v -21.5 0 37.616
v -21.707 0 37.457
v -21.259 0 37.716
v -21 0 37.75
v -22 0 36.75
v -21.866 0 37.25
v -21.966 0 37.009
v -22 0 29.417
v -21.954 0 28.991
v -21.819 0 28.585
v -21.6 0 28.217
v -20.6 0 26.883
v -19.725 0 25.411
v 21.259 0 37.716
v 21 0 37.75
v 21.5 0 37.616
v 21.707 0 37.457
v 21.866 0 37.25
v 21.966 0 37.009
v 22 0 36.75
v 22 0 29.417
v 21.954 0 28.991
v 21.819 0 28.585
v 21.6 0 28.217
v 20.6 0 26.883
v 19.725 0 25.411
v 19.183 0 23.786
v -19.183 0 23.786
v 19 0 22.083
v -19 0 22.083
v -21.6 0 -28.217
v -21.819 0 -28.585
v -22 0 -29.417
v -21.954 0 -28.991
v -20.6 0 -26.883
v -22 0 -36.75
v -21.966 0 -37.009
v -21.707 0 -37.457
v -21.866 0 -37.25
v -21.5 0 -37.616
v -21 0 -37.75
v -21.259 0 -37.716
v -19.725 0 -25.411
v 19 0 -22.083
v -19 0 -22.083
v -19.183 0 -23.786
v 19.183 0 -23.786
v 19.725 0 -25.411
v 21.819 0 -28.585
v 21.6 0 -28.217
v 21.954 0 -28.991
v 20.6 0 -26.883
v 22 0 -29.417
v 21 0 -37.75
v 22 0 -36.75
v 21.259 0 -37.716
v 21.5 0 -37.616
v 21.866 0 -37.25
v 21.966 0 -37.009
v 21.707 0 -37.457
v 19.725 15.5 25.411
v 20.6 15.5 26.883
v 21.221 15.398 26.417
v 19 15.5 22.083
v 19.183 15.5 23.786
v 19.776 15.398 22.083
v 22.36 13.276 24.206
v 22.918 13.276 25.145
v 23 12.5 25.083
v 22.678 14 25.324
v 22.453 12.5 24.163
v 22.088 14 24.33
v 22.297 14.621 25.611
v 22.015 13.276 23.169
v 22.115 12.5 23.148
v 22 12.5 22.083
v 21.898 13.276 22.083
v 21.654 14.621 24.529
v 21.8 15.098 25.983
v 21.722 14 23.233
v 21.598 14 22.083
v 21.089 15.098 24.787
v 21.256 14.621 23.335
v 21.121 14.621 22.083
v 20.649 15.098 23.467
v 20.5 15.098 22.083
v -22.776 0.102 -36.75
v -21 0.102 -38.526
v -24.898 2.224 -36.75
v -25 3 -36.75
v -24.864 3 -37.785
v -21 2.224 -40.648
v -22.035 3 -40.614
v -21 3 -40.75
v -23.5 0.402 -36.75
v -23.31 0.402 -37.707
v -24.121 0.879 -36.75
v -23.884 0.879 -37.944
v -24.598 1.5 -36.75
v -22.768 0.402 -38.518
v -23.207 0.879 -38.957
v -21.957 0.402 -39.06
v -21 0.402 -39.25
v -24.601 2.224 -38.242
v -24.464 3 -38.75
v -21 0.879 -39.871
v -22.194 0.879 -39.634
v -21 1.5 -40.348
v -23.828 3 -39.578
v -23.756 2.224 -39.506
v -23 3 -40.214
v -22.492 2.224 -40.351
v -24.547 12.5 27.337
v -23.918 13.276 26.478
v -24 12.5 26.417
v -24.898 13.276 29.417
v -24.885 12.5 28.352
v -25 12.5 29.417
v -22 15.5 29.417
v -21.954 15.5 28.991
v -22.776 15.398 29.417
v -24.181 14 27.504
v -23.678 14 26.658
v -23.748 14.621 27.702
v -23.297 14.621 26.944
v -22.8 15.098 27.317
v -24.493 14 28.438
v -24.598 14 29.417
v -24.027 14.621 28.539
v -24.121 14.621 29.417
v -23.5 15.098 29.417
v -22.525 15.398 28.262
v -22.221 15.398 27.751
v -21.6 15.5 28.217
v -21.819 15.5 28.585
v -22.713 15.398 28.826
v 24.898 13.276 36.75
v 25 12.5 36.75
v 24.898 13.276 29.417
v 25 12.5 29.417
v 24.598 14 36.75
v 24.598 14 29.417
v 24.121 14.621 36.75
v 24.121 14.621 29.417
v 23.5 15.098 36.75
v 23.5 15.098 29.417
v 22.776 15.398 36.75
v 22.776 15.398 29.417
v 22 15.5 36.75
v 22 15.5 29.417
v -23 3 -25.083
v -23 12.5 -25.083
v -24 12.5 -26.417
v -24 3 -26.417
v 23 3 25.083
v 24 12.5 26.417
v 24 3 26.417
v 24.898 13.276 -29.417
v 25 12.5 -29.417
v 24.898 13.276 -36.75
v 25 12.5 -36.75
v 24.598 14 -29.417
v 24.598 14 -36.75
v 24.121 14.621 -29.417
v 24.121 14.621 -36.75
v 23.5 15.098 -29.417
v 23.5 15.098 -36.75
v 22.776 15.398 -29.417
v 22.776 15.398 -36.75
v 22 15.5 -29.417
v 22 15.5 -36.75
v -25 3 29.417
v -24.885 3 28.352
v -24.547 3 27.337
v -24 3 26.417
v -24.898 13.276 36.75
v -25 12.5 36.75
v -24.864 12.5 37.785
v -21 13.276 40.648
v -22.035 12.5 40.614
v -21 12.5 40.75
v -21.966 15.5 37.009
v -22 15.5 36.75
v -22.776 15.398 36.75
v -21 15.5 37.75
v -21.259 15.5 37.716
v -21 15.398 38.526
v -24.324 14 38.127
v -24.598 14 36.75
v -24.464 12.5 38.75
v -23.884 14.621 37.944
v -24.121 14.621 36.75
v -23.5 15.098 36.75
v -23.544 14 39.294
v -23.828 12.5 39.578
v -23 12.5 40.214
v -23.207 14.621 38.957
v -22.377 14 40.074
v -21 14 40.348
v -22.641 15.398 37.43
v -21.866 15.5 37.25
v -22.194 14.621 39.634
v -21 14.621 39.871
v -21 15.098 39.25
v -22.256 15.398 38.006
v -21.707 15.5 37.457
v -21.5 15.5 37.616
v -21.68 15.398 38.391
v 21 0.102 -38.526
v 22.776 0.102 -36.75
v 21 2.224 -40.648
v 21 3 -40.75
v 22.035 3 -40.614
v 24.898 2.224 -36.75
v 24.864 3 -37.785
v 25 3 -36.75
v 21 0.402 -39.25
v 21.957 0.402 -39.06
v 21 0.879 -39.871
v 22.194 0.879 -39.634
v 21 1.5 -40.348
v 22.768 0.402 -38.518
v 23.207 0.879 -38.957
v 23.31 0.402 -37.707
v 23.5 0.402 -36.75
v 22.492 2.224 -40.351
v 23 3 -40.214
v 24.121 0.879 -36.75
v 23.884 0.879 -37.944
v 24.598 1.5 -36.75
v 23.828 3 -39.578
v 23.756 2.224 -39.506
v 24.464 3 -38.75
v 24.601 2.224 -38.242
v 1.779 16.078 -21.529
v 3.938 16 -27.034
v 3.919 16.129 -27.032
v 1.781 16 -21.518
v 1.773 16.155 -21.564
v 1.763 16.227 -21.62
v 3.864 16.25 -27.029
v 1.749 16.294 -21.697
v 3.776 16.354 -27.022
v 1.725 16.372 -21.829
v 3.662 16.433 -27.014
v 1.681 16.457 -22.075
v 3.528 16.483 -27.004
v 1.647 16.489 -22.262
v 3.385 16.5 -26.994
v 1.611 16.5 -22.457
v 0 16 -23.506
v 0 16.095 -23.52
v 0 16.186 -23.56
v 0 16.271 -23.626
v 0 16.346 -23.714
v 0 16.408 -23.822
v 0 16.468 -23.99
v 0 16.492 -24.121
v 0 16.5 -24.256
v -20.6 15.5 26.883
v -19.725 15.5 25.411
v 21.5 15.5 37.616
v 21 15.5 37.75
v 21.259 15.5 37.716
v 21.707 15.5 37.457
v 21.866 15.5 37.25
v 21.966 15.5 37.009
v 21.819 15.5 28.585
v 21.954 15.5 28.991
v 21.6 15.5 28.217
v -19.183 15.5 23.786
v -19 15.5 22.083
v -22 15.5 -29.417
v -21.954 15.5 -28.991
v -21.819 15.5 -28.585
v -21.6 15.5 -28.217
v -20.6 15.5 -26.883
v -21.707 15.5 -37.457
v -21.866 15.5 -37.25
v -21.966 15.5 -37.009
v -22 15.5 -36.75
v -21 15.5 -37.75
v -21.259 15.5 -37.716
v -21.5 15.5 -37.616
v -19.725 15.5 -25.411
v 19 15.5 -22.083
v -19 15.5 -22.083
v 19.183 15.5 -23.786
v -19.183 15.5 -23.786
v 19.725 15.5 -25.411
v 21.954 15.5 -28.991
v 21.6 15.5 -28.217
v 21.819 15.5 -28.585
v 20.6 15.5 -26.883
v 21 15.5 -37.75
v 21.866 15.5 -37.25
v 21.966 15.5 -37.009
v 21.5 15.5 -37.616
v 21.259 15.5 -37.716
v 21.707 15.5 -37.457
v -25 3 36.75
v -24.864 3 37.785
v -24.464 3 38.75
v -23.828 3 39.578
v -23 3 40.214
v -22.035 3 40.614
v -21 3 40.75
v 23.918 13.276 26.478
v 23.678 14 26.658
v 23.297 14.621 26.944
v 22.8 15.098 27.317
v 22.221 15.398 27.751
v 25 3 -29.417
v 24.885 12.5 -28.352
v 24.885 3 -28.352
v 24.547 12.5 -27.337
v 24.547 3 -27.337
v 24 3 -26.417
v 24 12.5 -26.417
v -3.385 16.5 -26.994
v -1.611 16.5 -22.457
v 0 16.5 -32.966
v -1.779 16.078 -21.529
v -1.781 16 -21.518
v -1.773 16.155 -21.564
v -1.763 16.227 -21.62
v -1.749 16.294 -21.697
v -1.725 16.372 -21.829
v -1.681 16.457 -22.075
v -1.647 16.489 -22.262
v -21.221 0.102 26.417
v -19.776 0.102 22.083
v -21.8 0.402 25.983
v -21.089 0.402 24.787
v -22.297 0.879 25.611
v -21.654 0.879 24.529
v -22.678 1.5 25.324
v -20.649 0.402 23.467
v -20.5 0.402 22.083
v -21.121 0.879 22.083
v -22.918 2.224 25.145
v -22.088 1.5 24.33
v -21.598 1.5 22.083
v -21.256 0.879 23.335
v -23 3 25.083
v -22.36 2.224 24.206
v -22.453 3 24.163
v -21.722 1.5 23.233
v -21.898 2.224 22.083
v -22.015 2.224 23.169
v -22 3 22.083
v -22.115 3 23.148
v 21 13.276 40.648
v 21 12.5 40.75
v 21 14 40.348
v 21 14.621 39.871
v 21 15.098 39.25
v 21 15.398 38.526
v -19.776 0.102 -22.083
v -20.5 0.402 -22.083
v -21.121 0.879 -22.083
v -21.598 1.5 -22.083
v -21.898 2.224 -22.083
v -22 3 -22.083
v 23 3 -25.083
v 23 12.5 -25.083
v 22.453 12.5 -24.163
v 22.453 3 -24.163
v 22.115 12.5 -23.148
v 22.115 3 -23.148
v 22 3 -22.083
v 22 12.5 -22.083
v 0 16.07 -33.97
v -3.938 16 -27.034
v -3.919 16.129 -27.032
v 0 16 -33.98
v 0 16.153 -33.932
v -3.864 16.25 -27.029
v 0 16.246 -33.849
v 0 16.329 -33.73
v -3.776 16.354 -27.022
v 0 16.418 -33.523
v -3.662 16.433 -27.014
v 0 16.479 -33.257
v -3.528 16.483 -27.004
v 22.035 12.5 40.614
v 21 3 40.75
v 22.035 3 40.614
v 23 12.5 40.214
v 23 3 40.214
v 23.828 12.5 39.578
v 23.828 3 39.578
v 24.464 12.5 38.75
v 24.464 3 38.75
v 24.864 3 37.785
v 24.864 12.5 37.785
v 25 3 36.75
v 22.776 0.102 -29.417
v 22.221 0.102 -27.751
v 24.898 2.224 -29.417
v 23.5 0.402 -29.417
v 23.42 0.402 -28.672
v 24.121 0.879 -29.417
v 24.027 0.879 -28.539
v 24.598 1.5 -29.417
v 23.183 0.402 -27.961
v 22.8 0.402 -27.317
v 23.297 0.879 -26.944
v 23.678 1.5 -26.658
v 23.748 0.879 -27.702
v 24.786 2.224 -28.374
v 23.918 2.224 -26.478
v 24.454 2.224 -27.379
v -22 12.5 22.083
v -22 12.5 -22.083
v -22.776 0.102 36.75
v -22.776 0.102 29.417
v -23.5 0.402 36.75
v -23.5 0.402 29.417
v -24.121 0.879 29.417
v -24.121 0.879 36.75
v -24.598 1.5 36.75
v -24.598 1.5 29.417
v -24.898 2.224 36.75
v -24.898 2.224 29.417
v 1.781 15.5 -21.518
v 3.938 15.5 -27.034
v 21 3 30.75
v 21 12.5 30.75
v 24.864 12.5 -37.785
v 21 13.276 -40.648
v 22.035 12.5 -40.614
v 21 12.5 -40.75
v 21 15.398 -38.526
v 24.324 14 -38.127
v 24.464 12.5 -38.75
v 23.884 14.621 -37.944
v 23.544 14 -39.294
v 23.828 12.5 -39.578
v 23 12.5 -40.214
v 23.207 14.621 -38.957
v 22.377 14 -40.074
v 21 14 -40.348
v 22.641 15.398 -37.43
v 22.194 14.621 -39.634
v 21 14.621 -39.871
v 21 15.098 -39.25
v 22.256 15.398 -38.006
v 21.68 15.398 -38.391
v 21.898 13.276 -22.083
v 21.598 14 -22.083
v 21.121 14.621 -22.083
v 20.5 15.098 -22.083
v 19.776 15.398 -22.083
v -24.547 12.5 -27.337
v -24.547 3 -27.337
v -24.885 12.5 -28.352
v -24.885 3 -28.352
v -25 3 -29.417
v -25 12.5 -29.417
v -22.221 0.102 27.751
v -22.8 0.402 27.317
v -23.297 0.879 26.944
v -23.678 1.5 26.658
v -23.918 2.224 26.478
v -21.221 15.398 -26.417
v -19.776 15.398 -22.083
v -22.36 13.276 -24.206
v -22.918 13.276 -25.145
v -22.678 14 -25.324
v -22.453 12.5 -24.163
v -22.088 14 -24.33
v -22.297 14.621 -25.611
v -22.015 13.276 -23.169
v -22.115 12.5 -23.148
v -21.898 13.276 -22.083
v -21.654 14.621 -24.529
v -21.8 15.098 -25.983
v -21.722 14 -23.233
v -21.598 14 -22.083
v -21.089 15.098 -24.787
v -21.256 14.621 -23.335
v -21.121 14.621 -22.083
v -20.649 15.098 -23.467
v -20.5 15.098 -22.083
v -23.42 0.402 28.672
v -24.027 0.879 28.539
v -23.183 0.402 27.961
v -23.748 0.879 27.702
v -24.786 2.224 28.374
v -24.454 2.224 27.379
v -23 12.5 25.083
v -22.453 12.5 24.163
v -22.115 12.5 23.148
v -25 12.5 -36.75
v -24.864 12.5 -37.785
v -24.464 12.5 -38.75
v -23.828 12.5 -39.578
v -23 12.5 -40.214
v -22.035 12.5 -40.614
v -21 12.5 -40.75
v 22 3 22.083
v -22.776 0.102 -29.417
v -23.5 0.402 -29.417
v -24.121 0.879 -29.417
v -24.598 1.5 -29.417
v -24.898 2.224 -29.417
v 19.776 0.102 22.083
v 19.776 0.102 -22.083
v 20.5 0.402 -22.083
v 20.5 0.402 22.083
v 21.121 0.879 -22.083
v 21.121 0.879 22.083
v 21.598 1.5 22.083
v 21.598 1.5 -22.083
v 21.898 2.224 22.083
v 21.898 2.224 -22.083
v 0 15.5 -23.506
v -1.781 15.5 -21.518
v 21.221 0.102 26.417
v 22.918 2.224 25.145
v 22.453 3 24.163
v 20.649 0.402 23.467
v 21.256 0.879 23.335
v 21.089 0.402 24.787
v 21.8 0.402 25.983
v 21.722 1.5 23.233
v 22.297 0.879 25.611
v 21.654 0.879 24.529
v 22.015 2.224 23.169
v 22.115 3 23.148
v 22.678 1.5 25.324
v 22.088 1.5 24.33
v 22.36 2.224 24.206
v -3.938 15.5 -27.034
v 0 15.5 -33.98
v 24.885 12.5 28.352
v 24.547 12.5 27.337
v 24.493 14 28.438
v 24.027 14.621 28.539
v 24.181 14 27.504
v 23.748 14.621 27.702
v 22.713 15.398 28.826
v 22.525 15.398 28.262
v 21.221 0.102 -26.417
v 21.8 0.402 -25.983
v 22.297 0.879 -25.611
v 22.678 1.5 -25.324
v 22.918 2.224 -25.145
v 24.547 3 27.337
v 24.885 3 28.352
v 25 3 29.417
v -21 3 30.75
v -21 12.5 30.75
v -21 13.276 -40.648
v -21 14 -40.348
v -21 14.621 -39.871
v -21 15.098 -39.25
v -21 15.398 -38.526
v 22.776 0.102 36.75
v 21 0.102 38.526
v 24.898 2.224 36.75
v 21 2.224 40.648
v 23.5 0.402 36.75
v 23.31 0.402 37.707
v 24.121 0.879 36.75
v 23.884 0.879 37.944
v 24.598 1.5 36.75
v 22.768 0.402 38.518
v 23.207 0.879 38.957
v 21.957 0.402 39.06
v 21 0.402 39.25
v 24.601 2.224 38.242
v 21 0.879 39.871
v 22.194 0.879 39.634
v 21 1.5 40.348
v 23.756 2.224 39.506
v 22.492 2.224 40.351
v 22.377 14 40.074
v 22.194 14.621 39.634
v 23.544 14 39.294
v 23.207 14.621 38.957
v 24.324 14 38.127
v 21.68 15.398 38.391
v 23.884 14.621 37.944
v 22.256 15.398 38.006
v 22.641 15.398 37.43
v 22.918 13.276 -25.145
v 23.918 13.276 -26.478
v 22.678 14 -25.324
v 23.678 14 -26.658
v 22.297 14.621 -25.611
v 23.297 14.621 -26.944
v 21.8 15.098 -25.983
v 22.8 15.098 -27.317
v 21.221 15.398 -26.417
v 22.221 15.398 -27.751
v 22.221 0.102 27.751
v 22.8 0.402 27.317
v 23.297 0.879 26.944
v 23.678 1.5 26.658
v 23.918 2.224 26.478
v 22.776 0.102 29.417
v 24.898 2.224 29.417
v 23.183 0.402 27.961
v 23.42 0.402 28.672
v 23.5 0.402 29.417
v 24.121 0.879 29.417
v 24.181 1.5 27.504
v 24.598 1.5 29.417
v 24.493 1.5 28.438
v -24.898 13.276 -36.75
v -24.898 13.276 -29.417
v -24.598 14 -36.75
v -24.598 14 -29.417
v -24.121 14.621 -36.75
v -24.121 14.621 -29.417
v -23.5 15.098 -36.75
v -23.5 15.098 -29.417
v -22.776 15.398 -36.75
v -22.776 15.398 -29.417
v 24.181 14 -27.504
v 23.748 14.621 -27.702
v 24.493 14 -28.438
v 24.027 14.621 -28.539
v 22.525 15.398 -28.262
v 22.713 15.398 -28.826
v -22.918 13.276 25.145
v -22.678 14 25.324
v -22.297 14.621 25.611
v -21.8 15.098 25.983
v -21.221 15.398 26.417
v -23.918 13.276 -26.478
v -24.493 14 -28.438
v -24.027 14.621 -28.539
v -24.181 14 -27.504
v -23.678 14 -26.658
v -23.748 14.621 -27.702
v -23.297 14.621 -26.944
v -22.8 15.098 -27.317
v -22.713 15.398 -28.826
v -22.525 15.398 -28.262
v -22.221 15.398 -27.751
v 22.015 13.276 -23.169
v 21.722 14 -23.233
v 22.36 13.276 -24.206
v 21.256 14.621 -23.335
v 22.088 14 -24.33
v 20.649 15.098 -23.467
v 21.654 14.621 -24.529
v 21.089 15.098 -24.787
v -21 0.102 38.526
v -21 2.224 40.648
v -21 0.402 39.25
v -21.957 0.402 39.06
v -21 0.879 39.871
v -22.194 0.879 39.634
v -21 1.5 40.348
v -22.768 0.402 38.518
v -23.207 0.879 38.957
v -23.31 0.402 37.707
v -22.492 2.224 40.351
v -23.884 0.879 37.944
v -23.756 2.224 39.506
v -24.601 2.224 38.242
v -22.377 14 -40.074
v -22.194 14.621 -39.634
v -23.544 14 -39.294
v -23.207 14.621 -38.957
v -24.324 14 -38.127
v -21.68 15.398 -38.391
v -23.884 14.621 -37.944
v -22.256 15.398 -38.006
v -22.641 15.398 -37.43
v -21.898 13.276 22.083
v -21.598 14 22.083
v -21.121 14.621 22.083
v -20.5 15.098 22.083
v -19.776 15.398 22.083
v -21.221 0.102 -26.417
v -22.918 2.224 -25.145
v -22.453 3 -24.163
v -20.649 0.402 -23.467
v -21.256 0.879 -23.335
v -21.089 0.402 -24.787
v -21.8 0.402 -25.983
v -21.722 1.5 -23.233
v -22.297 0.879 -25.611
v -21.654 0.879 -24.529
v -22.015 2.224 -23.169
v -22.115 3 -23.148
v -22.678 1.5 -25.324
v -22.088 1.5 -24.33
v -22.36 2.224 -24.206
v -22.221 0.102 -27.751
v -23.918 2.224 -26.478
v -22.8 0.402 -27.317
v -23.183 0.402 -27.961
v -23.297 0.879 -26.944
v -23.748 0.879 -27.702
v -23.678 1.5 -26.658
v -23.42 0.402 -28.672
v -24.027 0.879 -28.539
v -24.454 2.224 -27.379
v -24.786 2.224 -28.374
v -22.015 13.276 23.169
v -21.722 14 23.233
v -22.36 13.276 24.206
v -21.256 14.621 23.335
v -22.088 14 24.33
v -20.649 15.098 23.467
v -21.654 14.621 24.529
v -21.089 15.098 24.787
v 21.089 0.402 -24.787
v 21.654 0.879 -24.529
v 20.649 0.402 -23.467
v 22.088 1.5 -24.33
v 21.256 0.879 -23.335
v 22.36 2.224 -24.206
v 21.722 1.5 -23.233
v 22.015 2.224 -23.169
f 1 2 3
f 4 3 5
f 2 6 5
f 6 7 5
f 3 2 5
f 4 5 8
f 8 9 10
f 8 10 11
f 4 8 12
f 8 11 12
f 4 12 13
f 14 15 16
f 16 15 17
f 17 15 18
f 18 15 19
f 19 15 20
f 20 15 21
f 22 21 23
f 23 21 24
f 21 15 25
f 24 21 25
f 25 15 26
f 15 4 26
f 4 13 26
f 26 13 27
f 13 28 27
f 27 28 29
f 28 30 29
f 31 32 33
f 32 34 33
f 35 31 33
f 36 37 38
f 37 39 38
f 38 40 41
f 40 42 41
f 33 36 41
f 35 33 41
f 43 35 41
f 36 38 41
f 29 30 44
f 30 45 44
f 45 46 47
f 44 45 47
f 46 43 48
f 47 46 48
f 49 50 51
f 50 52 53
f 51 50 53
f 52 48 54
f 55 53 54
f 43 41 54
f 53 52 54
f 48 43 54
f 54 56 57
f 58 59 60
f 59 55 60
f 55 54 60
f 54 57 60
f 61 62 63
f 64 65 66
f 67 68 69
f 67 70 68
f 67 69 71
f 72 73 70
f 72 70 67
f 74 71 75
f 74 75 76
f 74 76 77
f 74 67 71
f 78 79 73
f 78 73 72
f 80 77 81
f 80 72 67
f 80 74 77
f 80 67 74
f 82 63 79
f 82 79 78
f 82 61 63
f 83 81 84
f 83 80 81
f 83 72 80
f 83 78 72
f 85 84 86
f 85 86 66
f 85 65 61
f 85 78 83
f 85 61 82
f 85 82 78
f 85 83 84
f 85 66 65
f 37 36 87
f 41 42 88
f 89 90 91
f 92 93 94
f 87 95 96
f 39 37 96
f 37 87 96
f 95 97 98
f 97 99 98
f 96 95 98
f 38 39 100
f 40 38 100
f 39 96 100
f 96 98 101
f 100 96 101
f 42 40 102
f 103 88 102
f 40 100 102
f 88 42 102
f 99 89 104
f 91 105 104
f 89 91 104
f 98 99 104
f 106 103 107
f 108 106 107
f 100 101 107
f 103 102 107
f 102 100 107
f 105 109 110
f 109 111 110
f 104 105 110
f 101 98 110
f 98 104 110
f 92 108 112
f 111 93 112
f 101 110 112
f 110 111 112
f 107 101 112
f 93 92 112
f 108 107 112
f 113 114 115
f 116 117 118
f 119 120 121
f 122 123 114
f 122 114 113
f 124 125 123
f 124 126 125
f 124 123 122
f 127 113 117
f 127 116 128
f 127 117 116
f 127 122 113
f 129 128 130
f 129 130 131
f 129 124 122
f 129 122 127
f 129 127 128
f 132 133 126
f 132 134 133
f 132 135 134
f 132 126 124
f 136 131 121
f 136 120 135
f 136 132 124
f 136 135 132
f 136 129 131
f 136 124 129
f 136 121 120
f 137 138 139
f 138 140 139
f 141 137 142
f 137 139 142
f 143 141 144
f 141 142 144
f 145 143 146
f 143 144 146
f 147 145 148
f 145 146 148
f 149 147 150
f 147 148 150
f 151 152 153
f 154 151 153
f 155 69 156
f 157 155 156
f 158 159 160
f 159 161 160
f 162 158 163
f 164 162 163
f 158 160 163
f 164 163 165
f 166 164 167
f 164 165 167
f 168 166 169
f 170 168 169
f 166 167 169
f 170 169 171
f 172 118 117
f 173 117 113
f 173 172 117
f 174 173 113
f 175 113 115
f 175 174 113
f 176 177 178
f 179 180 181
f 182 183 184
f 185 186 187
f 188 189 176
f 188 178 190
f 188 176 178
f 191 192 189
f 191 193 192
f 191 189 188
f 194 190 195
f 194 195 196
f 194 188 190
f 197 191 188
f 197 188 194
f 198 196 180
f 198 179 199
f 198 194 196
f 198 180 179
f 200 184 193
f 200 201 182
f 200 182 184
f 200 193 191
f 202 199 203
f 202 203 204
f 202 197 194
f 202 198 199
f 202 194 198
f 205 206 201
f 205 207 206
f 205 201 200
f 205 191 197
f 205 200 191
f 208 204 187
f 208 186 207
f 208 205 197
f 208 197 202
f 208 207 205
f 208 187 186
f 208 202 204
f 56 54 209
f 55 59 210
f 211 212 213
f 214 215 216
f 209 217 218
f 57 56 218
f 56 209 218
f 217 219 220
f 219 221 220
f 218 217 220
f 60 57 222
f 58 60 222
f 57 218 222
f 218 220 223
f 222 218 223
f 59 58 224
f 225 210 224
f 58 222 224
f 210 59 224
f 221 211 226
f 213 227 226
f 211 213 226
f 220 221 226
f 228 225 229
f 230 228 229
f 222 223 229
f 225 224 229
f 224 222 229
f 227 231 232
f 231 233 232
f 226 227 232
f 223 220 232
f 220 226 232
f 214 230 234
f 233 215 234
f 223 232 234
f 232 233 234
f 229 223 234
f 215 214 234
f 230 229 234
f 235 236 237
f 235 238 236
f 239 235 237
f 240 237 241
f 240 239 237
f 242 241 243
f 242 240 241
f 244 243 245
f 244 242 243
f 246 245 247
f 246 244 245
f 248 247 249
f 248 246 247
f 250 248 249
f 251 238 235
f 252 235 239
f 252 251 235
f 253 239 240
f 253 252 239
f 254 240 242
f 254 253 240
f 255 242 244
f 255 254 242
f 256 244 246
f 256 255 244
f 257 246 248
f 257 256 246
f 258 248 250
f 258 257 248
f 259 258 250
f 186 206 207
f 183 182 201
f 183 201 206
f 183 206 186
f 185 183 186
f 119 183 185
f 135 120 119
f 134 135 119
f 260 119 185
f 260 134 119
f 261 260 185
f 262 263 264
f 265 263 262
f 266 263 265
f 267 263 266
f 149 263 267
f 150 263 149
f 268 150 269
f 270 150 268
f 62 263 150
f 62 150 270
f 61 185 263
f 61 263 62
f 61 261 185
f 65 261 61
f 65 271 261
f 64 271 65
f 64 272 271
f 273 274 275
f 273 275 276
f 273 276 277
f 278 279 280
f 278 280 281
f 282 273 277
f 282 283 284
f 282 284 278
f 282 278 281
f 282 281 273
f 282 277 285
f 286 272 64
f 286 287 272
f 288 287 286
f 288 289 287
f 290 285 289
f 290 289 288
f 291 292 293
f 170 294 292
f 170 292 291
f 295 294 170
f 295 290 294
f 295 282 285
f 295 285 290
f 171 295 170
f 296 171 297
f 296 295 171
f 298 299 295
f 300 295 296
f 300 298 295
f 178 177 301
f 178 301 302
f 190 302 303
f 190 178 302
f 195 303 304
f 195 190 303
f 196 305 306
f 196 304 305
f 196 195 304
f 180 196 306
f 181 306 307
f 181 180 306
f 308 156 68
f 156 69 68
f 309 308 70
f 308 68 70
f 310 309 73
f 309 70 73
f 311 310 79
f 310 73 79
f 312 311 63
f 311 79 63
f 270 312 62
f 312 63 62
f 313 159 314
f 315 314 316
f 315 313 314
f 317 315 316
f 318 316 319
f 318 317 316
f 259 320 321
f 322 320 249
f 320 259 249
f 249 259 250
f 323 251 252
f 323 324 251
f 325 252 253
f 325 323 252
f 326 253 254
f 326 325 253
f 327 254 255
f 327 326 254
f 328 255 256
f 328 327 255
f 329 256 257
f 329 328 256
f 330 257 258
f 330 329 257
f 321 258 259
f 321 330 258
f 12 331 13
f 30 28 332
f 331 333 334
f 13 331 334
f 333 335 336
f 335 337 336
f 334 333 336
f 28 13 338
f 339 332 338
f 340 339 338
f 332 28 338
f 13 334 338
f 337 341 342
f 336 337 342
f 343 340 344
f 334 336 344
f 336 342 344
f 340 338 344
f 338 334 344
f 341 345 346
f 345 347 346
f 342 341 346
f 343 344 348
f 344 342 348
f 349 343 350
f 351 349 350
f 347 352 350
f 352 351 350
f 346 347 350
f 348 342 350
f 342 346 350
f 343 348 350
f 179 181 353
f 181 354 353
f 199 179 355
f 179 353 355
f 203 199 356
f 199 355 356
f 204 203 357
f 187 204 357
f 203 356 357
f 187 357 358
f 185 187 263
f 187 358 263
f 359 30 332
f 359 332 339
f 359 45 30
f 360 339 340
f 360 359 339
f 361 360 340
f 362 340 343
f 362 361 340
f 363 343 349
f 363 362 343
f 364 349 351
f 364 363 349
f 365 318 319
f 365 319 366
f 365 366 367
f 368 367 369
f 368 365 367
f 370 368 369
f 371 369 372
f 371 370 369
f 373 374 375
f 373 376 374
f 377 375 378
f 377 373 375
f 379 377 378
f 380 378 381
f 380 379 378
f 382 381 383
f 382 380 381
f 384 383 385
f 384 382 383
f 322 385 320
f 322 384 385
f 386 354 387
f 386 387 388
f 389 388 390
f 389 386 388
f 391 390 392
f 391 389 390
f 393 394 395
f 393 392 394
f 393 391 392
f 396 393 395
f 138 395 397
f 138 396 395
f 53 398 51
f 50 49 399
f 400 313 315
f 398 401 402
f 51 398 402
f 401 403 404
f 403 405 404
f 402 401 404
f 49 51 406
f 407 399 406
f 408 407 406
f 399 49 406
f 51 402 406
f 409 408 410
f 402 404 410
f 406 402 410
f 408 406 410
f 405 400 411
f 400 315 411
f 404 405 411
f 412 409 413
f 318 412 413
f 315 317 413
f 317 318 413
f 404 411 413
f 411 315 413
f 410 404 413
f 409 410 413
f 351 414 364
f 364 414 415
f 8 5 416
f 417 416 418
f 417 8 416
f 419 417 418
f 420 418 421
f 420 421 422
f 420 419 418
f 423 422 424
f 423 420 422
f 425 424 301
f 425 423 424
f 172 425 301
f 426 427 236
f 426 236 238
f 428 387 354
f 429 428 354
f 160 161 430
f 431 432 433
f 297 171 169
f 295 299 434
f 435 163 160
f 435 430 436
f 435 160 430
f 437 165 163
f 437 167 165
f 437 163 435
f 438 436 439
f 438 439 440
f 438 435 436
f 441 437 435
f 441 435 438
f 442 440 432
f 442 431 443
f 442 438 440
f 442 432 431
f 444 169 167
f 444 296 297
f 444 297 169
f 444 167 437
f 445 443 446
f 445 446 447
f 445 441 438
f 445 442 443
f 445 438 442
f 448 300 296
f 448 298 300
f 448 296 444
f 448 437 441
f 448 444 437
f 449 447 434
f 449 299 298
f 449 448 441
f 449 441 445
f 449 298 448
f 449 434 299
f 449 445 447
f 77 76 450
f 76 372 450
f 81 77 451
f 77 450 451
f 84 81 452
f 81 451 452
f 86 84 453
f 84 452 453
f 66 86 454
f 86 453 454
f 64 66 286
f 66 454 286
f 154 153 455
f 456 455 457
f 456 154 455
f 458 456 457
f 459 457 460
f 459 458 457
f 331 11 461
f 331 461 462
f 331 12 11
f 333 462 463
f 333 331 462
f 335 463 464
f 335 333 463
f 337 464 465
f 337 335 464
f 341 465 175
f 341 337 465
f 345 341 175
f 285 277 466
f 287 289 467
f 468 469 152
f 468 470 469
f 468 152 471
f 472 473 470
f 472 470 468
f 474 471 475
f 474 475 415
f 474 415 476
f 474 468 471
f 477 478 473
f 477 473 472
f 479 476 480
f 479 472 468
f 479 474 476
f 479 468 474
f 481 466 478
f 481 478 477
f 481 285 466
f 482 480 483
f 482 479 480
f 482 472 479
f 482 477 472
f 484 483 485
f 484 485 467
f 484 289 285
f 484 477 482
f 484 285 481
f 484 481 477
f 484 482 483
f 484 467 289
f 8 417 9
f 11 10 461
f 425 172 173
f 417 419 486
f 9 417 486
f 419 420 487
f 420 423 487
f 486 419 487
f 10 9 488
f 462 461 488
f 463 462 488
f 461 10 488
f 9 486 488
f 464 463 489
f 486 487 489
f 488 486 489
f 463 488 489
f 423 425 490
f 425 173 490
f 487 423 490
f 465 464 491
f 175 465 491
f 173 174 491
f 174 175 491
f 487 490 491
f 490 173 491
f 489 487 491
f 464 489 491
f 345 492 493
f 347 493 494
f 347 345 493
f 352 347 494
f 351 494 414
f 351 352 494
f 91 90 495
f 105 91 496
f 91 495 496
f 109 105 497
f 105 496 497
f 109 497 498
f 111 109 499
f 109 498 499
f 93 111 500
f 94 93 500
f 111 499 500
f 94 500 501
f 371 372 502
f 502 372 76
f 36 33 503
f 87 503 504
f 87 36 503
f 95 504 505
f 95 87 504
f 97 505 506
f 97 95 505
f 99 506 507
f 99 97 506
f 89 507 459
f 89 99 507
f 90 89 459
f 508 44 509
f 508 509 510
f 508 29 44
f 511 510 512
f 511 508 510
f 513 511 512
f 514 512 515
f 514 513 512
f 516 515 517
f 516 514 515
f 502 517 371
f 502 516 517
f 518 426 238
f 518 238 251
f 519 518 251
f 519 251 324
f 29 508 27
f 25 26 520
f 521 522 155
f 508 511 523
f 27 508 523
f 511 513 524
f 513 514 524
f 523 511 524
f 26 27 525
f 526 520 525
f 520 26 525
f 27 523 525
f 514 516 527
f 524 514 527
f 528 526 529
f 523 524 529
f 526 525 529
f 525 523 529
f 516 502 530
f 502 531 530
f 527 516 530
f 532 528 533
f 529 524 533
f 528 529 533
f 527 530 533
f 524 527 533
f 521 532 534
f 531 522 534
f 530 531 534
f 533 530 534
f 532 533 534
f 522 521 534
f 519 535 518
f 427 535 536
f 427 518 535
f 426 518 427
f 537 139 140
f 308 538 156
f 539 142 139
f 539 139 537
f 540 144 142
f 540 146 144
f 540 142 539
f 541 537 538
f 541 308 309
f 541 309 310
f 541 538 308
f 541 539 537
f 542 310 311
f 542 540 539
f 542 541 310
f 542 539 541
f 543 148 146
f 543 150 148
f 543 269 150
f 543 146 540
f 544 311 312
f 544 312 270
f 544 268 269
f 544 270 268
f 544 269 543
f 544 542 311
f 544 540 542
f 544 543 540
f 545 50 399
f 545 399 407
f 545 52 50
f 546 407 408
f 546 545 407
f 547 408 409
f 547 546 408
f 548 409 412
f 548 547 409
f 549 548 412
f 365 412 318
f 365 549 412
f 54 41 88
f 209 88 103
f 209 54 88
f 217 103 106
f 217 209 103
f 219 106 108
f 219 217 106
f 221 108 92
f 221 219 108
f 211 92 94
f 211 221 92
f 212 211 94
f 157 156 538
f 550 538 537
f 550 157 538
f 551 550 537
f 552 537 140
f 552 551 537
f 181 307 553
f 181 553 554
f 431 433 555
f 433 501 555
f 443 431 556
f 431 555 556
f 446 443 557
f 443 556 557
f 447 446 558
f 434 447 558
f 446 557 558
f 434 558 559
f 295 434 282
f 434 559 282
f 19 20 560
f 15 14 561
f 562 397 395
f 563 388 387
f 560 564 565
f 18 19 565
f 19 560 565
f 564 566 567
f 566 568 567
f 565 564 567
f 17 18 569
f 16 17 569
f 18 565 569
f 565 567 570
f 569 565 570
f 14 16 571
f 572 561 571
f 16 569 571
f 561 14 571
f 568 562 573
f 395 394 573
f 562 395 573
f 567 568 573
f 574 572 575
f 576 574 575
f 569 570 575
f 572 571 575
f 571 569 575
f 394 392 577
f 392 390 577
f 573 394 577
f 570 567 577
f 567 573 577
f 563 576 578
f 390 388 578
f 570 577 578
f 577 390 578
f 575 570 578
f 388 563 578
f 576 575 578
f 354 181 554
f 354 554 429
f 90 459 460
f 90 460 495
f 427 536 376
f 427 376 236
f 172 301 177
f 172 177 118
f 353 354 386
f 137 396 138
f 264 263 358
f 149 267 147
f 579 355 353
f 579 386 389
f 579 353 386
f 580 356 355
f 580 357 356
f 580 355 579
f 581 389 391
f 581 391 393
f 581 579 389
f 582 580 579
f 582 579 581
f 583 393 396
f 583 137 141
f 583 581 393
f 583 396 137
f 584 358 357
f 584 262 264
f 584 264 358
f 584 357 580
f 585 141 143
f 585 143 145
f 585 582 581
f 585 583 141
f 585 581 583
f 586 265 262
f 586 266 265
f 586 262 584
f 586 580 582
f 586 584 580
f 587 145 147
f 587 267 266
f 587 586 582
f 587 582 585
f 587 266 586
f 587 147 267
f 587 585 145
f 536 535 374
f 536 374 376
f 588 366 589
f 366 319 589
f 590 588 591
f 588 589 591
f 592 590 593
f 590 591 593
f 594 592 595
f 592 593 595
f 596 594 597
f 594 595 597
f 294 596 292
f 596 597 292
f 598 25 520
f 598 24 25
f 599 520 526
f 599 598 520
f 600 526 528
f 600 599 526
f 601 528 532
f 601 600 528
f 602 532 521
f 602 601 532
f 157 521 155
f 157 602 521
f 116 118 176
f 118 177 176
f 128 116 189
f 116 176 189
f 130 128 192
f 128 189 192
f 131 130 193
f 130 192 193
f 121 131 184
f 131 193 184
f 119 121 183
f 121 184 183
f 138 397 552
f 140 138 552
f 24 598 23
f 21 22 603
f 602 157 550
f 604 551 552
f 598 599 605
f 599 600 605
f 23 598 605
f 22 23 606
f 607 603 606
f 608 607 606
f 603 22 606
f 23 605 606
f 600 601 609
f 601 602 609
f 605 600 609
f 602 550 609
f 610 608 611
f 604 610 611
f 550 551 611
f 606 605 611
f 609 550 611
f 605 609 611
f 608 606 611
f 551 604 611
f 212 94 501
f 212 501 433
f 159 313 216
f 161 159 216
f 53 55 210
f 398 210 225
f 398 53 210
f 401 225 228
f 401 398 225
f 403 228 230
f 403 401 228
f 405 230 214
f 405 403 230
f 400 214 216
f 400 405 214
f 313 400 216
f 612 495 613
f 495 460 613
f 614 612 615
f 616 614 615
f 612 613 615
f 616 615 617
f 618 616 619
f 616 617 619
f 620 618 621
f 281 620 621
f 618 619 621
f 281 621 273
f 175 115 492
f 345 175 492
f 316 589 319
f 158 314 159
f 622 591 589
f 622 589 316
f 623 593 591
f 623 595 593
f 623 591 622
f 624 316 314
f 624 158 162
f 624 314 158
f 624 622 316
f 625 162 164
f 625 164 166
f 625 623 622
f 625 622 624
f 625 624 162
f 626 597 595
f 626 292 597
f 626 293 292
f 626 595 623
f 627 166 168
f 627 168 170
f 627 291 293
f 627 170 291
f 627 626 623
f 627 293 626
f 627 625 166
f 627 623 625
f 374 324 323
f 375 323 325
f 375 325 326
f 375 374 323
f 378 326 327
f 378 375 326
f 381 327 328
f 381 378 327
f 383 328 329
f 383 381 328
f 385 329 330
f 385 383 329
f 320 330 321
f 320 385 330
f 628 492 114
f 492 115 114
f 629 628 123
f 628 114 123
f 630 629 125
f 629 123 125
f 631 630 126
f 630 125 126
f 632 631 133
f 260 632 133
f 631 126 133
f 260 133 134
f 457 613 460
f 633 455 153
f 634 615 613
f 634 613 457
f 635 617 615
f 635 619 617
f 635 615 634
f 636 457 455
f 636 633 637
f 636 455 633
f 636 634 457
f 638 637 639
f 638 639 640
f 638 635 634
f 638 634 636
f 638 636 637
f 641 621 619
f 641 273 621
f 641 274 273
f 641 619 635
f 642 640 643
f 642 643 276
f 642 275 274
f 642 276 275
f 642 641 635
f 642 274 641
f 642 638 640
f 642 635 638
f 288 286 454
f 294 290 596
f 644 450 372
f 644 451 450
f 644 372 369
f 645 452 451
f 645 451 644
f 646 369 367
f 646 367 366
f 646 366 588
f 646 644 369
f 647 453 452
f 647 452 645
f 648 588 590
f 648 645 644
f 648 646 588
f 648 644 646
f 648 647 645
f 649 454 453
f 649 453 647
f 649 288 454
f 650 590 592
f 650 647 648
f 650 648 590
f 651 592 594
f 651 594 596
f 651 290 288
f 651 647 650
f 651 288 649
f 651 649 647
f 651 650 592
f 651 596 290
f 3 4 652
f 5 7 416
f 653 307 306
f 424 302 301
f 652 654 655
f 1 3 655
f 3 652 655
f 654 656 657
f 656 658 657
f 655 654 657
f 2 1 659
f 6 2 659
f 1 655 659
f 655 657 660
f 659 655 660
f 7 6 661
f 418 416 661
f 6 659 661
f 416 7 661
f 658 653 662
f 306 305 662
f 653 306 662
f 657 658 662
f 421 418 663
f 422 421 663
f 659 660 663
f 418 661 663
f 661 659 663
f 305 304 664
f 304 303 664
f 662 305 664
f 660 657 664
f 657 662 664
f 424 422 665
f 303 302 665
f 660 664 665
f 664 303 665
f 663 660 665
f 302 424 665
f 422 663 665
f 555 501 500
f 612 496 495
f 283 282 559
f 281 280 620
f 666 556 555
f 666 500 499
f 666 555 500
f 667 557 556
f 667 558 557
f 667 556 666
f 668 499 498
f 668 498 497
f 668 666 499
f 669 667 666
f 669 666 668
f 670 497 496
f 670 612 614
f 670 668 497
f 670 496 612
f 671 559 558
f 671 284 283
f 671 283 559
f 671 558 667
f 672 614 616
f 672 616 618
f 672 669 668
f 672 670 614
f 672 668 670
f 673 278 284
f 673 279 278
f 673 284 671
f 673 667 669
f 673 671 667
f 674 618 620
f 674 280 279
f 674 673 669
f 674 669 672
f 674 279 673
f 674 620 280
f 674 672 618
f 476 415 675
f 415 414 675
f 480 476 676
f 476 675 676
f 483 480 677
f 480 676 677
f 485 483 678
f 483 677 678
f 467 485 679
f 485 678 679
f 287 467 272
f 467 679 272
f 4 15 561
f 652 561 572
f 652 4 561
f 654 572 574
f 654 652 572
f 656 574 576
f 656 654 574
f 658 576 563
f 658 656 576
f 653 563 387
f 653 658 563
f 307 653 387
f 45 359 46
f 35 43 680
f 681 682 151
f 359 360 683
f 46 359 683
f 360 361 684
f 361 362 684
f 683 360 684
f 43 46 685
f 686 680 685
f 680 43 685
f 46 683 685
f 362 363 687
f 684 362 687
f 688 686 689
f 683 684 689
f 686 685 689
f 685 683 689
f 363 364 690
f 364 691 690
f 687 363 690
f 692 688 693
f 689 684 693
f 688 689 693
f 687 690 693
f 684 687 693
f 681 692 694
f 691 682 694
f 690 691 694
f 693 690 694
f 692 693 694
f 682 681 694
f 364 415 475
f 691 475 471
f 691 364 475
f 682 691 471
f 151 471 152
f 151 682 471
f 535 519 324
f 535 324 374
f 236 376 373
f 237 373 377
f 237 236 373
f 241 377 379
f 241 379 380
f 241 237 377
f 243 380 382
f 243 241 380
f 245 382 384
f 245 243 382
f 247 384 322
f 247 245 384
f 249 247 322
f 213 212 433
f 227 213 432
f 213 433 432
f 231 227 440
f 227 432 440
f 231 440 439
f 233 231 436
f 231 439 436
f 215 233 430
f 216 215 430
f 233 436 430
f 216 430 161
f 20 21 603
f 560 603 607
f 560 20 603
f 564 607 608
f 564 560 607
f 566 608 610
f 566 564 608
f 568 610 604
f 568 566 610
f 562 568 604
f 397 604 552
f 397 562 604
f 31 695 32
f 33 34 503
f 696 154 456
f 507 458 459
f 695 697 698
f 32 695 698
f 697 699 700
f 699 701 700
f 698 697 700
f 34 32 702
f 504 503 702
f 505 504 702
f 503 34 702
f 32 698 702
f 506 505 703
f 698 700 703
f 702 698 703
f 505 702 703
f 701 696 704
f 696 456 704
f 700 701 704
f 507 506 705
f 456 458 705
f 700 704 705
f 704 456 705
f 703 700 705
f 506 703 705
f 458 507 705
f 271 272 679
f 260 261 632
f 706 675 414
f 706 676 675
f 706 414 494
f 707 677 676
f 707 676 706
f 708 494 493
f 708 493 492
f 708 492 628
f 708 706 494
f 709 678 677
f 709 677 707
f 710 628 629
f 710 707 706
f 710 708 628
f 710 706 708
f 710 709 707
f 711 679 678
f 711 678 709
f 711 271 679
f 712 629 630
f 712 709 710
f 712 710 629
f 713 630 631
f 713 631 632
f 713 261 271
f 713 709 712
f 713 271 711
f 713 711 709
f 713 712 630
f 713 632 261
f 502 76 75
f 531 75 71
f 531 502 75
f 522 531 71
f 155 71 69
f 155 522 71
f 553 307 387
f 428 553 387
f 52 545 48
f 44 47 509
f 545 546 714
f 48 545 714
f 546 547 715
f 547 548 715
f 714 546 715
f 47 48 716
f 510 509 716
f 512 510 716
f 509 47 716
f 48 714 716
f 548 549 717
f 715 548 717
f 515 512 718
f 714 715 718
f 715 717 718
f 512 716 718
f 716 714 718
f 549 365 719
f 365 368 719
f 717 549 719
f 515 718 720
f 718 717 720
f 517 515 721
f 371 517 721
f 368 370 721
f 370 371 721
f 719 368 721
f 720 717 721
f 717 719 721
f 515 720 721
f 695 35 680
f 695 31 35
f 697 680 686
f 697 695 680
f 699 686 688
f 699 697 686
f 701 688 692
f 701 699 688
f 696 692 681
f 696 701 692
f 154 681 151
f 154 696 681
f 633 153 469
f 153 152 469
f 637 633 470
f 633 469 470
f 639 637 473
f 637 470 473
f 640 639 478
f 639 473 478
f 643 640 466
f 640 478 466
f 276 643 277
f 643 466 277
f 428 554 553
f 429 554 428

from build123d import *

# Parameters (mm, degrees)
SKETCH1_W           = 50
SKETCH1_H           = 81.5
BOSS_EXTRUDE1_DEPTH = 15.5
CUT_EXTRUDE4_DEPTH  = 51.257462133
CUT_EXTRUDE5_DEPTH  = 51.257462133
FILLET1_R           = 5
FILLET3_R           = 4
FILLET4_R           = 3
BOSS_EXTRUDE2_DEPTH = 1
FILLET5_R           = 0.5
SKETCH6_W           = 42
SKETCH6_H           = 9.5
CUT_EXTRUDE6_DEPTH  = 10


with BuildPart() as part:
    # Sketch1 → Boss-Extrude1 (new body)
    with BuildSketch(Plane(origin=(0, 0, 0), x_dir=(1, 0, 0), z_dir=(0, 1, 0))):
        Rectangle(SKETCH1_W, SKETCH1_H)
    extrude(amount=BOSS_EXTRUDE1_DEPTH)

    # Sketch2 → Cut-Extrude4 (cut, through all)
    with BuildSketch(Plane(origin=(0, 15.5, 0), x_dir=(-1, 0, 0), z_dir=(0, 1, 0))):
        Polygon((-22, 23.75), (-25, 27.75), (-25, -27.75), (-22, -23.75), align=None)
    extrude(amount=-CUT_EXTRUDE4_DEPTH, mode=Mode.SUBTRACT)

    # Sketch2<6> → Cut-Extrude5 (cut, through all)
    with BuildSketch(Plane(origin=(0, 15.5, 0), x_dir=(-1, 0, 0), z_dir=(0, 1, 0))):
        Polygon((22, -23.75), (25, -27.75), (25, 27.75), (22, 23.75), align=None)
    extrude(amount=-CUT_EXTRUDE5_DEPTH, mode=Mode.SUBTRACT)

    # Fillet1
    fillet1_edges = [part.edges().sort_by_distance(p)[0] for p in [
        (25, 7.75, -27.75),
        (25, 7.75, 27.75),
        (22, 7.75, 23.75),
        (22, 7.75, -23.75),
        (-25, 7.75, 27.75),
        (-25, 7.75, -27.75),
        (-22, 7.75, -23.75),
        (-22, 7.75, 23.75),
    ]]
    fillet(fillet1_edges, radius=FILLET1_R)

    # Fillet3
    fillet3_edges = [part.edges().sort_by_distance(p)[0] for p in [
        (25, 7.75, 40.75),
        (-25, 7.75, 40.75),
        (-25, 7.75, -40.75),
        (25, 7.75, -40.75),
    ]]
    fillet(fillet3_edges, radius=FILLET3_R)

    # Fillet4
    fillet4_edges = [part.edges().sort_by_distance(p)[0] for p in [
        (24.74341649, 0, 27.835527837),
        (23.5, 0, 25.75),
        (22.25658351, 0, 23.664472163),
        (22, 0, 0),
        (22.25658351, 0, -23.664472163),
        (23.5, 0, -25.75),
        (24.74341649, 0, -27.835527837),
        (25, 0, -33.083333333),
        (23.828427125, 0, -39.578427125),
        (0, 0, -40.75),
        (-23.828427125, 0, -39.578427125),
        (-25, 0, -33.083333333),
        (-24.74341649, 0, -27.835527837),
        (-23.5, 0, -25.75),
        (-22.25658351, 0, -23.664472163),
        (-22, 0, 0),
        (-22.25658351, 0, 23.664472163),
        (-23.5, 0, 25.75),
        (-24.74341649, 0, 27.835527837),
        (-25, 0, 33.083333333),
        (-23.828427125, 0, 39.578427125),
        (0, 0, 40.75),
        (23.828427125, 0, 39.578427125),
        (25, 0, 33.083333333),
        (-23.828427125, 15.5, 39.578427125),
        (-25, 15.5, 33.083333333),
        (-24.74341649, 15.5, 27.835527837),
        (-23.5, 15.5, 25.75),
        (-22.25658351, 15.5, 23.664472163),
        (-22, 15.5, 0),
        (-22.25658351, 15.5, -23.664472163),
        (-23.5, 15.5, -25.75),
        (-24.74341649, 15.5, -27.835527837),
        (-25, 15.5, -33.083333333),
        (-23.828427125, 15.5, -39.578427125),
        (0, 15.5, -40.75),
        (23.828427125, 15.5, -39.578427125),
        (25, 15.5, -33.083333333),
        (24.74341649, 15.5, -27.835527837),
        (23.5, 15.5, -25.75),
        (22.25658351, 15.5, -23.664472163),
        (22, 15.5, 0),
        (22.25658351, 15.5, 23.664472163),
        (23.5, 15.5, 25.75),
        (24.74341649, 15.5, 27.835527837),
        (25, 15.5, 33.083333333),
        (23.828427125, 15.5, 39.578427125),
        (0, 15.5, 40.75),
    ]]
    fillet(fillet4_edges, radius=FILLET4_R)

    # Sketch6 → Cut-Extrude6 (cut)
    with BuildSketch(Plane.XY.offset(40.75)):
        with Locations((0, 7.75)):
            Rectangle(SKETCH6_W, SKETCH6_H)
    extrude(amount=-CUT_EXTRUDE6_DEPTH, mode=Mode.SUBTRACT)


with BuildPart() as body_2:
    # Sketch5 → Boss-Extrude2 (new body)
    with BuildSketch(Plane(origin=(0, 15.5, 0), x_dir=(-1, 0, 0), z_dir=(0, 1, 0))):
        Polygon((0, -23.506374229), (1.781243622, -21.517911068), (3.937786411, -27.033800367), (0, -33.980226737), (-3.937786411, -27.033800367), (-1.781243622, -21.517911068), align=None)
    extrude(amount=BOSS_EXTRUDE2_DEPTH)

    # Fillet5
    fillet5_edges = [body_2.edges().sort_by_distance(p)[0] for p in [
        (1.968893205, 16.5, -30.507013552),
        (-1.968893205, 16.5, -30.507013552),
        (-2.859515016, 16.5, -24.275855717),
        (-0.890621811, 16.5, -22.512142648),
        (0.890621811, 16.5, -22.512142648),
        (2.859515016, 16.5, -24.275855717),
    ]]
    fillet(fillet5_edges, radius=FILLET5_R)


solid = Compound([part.part, body_2.part])
